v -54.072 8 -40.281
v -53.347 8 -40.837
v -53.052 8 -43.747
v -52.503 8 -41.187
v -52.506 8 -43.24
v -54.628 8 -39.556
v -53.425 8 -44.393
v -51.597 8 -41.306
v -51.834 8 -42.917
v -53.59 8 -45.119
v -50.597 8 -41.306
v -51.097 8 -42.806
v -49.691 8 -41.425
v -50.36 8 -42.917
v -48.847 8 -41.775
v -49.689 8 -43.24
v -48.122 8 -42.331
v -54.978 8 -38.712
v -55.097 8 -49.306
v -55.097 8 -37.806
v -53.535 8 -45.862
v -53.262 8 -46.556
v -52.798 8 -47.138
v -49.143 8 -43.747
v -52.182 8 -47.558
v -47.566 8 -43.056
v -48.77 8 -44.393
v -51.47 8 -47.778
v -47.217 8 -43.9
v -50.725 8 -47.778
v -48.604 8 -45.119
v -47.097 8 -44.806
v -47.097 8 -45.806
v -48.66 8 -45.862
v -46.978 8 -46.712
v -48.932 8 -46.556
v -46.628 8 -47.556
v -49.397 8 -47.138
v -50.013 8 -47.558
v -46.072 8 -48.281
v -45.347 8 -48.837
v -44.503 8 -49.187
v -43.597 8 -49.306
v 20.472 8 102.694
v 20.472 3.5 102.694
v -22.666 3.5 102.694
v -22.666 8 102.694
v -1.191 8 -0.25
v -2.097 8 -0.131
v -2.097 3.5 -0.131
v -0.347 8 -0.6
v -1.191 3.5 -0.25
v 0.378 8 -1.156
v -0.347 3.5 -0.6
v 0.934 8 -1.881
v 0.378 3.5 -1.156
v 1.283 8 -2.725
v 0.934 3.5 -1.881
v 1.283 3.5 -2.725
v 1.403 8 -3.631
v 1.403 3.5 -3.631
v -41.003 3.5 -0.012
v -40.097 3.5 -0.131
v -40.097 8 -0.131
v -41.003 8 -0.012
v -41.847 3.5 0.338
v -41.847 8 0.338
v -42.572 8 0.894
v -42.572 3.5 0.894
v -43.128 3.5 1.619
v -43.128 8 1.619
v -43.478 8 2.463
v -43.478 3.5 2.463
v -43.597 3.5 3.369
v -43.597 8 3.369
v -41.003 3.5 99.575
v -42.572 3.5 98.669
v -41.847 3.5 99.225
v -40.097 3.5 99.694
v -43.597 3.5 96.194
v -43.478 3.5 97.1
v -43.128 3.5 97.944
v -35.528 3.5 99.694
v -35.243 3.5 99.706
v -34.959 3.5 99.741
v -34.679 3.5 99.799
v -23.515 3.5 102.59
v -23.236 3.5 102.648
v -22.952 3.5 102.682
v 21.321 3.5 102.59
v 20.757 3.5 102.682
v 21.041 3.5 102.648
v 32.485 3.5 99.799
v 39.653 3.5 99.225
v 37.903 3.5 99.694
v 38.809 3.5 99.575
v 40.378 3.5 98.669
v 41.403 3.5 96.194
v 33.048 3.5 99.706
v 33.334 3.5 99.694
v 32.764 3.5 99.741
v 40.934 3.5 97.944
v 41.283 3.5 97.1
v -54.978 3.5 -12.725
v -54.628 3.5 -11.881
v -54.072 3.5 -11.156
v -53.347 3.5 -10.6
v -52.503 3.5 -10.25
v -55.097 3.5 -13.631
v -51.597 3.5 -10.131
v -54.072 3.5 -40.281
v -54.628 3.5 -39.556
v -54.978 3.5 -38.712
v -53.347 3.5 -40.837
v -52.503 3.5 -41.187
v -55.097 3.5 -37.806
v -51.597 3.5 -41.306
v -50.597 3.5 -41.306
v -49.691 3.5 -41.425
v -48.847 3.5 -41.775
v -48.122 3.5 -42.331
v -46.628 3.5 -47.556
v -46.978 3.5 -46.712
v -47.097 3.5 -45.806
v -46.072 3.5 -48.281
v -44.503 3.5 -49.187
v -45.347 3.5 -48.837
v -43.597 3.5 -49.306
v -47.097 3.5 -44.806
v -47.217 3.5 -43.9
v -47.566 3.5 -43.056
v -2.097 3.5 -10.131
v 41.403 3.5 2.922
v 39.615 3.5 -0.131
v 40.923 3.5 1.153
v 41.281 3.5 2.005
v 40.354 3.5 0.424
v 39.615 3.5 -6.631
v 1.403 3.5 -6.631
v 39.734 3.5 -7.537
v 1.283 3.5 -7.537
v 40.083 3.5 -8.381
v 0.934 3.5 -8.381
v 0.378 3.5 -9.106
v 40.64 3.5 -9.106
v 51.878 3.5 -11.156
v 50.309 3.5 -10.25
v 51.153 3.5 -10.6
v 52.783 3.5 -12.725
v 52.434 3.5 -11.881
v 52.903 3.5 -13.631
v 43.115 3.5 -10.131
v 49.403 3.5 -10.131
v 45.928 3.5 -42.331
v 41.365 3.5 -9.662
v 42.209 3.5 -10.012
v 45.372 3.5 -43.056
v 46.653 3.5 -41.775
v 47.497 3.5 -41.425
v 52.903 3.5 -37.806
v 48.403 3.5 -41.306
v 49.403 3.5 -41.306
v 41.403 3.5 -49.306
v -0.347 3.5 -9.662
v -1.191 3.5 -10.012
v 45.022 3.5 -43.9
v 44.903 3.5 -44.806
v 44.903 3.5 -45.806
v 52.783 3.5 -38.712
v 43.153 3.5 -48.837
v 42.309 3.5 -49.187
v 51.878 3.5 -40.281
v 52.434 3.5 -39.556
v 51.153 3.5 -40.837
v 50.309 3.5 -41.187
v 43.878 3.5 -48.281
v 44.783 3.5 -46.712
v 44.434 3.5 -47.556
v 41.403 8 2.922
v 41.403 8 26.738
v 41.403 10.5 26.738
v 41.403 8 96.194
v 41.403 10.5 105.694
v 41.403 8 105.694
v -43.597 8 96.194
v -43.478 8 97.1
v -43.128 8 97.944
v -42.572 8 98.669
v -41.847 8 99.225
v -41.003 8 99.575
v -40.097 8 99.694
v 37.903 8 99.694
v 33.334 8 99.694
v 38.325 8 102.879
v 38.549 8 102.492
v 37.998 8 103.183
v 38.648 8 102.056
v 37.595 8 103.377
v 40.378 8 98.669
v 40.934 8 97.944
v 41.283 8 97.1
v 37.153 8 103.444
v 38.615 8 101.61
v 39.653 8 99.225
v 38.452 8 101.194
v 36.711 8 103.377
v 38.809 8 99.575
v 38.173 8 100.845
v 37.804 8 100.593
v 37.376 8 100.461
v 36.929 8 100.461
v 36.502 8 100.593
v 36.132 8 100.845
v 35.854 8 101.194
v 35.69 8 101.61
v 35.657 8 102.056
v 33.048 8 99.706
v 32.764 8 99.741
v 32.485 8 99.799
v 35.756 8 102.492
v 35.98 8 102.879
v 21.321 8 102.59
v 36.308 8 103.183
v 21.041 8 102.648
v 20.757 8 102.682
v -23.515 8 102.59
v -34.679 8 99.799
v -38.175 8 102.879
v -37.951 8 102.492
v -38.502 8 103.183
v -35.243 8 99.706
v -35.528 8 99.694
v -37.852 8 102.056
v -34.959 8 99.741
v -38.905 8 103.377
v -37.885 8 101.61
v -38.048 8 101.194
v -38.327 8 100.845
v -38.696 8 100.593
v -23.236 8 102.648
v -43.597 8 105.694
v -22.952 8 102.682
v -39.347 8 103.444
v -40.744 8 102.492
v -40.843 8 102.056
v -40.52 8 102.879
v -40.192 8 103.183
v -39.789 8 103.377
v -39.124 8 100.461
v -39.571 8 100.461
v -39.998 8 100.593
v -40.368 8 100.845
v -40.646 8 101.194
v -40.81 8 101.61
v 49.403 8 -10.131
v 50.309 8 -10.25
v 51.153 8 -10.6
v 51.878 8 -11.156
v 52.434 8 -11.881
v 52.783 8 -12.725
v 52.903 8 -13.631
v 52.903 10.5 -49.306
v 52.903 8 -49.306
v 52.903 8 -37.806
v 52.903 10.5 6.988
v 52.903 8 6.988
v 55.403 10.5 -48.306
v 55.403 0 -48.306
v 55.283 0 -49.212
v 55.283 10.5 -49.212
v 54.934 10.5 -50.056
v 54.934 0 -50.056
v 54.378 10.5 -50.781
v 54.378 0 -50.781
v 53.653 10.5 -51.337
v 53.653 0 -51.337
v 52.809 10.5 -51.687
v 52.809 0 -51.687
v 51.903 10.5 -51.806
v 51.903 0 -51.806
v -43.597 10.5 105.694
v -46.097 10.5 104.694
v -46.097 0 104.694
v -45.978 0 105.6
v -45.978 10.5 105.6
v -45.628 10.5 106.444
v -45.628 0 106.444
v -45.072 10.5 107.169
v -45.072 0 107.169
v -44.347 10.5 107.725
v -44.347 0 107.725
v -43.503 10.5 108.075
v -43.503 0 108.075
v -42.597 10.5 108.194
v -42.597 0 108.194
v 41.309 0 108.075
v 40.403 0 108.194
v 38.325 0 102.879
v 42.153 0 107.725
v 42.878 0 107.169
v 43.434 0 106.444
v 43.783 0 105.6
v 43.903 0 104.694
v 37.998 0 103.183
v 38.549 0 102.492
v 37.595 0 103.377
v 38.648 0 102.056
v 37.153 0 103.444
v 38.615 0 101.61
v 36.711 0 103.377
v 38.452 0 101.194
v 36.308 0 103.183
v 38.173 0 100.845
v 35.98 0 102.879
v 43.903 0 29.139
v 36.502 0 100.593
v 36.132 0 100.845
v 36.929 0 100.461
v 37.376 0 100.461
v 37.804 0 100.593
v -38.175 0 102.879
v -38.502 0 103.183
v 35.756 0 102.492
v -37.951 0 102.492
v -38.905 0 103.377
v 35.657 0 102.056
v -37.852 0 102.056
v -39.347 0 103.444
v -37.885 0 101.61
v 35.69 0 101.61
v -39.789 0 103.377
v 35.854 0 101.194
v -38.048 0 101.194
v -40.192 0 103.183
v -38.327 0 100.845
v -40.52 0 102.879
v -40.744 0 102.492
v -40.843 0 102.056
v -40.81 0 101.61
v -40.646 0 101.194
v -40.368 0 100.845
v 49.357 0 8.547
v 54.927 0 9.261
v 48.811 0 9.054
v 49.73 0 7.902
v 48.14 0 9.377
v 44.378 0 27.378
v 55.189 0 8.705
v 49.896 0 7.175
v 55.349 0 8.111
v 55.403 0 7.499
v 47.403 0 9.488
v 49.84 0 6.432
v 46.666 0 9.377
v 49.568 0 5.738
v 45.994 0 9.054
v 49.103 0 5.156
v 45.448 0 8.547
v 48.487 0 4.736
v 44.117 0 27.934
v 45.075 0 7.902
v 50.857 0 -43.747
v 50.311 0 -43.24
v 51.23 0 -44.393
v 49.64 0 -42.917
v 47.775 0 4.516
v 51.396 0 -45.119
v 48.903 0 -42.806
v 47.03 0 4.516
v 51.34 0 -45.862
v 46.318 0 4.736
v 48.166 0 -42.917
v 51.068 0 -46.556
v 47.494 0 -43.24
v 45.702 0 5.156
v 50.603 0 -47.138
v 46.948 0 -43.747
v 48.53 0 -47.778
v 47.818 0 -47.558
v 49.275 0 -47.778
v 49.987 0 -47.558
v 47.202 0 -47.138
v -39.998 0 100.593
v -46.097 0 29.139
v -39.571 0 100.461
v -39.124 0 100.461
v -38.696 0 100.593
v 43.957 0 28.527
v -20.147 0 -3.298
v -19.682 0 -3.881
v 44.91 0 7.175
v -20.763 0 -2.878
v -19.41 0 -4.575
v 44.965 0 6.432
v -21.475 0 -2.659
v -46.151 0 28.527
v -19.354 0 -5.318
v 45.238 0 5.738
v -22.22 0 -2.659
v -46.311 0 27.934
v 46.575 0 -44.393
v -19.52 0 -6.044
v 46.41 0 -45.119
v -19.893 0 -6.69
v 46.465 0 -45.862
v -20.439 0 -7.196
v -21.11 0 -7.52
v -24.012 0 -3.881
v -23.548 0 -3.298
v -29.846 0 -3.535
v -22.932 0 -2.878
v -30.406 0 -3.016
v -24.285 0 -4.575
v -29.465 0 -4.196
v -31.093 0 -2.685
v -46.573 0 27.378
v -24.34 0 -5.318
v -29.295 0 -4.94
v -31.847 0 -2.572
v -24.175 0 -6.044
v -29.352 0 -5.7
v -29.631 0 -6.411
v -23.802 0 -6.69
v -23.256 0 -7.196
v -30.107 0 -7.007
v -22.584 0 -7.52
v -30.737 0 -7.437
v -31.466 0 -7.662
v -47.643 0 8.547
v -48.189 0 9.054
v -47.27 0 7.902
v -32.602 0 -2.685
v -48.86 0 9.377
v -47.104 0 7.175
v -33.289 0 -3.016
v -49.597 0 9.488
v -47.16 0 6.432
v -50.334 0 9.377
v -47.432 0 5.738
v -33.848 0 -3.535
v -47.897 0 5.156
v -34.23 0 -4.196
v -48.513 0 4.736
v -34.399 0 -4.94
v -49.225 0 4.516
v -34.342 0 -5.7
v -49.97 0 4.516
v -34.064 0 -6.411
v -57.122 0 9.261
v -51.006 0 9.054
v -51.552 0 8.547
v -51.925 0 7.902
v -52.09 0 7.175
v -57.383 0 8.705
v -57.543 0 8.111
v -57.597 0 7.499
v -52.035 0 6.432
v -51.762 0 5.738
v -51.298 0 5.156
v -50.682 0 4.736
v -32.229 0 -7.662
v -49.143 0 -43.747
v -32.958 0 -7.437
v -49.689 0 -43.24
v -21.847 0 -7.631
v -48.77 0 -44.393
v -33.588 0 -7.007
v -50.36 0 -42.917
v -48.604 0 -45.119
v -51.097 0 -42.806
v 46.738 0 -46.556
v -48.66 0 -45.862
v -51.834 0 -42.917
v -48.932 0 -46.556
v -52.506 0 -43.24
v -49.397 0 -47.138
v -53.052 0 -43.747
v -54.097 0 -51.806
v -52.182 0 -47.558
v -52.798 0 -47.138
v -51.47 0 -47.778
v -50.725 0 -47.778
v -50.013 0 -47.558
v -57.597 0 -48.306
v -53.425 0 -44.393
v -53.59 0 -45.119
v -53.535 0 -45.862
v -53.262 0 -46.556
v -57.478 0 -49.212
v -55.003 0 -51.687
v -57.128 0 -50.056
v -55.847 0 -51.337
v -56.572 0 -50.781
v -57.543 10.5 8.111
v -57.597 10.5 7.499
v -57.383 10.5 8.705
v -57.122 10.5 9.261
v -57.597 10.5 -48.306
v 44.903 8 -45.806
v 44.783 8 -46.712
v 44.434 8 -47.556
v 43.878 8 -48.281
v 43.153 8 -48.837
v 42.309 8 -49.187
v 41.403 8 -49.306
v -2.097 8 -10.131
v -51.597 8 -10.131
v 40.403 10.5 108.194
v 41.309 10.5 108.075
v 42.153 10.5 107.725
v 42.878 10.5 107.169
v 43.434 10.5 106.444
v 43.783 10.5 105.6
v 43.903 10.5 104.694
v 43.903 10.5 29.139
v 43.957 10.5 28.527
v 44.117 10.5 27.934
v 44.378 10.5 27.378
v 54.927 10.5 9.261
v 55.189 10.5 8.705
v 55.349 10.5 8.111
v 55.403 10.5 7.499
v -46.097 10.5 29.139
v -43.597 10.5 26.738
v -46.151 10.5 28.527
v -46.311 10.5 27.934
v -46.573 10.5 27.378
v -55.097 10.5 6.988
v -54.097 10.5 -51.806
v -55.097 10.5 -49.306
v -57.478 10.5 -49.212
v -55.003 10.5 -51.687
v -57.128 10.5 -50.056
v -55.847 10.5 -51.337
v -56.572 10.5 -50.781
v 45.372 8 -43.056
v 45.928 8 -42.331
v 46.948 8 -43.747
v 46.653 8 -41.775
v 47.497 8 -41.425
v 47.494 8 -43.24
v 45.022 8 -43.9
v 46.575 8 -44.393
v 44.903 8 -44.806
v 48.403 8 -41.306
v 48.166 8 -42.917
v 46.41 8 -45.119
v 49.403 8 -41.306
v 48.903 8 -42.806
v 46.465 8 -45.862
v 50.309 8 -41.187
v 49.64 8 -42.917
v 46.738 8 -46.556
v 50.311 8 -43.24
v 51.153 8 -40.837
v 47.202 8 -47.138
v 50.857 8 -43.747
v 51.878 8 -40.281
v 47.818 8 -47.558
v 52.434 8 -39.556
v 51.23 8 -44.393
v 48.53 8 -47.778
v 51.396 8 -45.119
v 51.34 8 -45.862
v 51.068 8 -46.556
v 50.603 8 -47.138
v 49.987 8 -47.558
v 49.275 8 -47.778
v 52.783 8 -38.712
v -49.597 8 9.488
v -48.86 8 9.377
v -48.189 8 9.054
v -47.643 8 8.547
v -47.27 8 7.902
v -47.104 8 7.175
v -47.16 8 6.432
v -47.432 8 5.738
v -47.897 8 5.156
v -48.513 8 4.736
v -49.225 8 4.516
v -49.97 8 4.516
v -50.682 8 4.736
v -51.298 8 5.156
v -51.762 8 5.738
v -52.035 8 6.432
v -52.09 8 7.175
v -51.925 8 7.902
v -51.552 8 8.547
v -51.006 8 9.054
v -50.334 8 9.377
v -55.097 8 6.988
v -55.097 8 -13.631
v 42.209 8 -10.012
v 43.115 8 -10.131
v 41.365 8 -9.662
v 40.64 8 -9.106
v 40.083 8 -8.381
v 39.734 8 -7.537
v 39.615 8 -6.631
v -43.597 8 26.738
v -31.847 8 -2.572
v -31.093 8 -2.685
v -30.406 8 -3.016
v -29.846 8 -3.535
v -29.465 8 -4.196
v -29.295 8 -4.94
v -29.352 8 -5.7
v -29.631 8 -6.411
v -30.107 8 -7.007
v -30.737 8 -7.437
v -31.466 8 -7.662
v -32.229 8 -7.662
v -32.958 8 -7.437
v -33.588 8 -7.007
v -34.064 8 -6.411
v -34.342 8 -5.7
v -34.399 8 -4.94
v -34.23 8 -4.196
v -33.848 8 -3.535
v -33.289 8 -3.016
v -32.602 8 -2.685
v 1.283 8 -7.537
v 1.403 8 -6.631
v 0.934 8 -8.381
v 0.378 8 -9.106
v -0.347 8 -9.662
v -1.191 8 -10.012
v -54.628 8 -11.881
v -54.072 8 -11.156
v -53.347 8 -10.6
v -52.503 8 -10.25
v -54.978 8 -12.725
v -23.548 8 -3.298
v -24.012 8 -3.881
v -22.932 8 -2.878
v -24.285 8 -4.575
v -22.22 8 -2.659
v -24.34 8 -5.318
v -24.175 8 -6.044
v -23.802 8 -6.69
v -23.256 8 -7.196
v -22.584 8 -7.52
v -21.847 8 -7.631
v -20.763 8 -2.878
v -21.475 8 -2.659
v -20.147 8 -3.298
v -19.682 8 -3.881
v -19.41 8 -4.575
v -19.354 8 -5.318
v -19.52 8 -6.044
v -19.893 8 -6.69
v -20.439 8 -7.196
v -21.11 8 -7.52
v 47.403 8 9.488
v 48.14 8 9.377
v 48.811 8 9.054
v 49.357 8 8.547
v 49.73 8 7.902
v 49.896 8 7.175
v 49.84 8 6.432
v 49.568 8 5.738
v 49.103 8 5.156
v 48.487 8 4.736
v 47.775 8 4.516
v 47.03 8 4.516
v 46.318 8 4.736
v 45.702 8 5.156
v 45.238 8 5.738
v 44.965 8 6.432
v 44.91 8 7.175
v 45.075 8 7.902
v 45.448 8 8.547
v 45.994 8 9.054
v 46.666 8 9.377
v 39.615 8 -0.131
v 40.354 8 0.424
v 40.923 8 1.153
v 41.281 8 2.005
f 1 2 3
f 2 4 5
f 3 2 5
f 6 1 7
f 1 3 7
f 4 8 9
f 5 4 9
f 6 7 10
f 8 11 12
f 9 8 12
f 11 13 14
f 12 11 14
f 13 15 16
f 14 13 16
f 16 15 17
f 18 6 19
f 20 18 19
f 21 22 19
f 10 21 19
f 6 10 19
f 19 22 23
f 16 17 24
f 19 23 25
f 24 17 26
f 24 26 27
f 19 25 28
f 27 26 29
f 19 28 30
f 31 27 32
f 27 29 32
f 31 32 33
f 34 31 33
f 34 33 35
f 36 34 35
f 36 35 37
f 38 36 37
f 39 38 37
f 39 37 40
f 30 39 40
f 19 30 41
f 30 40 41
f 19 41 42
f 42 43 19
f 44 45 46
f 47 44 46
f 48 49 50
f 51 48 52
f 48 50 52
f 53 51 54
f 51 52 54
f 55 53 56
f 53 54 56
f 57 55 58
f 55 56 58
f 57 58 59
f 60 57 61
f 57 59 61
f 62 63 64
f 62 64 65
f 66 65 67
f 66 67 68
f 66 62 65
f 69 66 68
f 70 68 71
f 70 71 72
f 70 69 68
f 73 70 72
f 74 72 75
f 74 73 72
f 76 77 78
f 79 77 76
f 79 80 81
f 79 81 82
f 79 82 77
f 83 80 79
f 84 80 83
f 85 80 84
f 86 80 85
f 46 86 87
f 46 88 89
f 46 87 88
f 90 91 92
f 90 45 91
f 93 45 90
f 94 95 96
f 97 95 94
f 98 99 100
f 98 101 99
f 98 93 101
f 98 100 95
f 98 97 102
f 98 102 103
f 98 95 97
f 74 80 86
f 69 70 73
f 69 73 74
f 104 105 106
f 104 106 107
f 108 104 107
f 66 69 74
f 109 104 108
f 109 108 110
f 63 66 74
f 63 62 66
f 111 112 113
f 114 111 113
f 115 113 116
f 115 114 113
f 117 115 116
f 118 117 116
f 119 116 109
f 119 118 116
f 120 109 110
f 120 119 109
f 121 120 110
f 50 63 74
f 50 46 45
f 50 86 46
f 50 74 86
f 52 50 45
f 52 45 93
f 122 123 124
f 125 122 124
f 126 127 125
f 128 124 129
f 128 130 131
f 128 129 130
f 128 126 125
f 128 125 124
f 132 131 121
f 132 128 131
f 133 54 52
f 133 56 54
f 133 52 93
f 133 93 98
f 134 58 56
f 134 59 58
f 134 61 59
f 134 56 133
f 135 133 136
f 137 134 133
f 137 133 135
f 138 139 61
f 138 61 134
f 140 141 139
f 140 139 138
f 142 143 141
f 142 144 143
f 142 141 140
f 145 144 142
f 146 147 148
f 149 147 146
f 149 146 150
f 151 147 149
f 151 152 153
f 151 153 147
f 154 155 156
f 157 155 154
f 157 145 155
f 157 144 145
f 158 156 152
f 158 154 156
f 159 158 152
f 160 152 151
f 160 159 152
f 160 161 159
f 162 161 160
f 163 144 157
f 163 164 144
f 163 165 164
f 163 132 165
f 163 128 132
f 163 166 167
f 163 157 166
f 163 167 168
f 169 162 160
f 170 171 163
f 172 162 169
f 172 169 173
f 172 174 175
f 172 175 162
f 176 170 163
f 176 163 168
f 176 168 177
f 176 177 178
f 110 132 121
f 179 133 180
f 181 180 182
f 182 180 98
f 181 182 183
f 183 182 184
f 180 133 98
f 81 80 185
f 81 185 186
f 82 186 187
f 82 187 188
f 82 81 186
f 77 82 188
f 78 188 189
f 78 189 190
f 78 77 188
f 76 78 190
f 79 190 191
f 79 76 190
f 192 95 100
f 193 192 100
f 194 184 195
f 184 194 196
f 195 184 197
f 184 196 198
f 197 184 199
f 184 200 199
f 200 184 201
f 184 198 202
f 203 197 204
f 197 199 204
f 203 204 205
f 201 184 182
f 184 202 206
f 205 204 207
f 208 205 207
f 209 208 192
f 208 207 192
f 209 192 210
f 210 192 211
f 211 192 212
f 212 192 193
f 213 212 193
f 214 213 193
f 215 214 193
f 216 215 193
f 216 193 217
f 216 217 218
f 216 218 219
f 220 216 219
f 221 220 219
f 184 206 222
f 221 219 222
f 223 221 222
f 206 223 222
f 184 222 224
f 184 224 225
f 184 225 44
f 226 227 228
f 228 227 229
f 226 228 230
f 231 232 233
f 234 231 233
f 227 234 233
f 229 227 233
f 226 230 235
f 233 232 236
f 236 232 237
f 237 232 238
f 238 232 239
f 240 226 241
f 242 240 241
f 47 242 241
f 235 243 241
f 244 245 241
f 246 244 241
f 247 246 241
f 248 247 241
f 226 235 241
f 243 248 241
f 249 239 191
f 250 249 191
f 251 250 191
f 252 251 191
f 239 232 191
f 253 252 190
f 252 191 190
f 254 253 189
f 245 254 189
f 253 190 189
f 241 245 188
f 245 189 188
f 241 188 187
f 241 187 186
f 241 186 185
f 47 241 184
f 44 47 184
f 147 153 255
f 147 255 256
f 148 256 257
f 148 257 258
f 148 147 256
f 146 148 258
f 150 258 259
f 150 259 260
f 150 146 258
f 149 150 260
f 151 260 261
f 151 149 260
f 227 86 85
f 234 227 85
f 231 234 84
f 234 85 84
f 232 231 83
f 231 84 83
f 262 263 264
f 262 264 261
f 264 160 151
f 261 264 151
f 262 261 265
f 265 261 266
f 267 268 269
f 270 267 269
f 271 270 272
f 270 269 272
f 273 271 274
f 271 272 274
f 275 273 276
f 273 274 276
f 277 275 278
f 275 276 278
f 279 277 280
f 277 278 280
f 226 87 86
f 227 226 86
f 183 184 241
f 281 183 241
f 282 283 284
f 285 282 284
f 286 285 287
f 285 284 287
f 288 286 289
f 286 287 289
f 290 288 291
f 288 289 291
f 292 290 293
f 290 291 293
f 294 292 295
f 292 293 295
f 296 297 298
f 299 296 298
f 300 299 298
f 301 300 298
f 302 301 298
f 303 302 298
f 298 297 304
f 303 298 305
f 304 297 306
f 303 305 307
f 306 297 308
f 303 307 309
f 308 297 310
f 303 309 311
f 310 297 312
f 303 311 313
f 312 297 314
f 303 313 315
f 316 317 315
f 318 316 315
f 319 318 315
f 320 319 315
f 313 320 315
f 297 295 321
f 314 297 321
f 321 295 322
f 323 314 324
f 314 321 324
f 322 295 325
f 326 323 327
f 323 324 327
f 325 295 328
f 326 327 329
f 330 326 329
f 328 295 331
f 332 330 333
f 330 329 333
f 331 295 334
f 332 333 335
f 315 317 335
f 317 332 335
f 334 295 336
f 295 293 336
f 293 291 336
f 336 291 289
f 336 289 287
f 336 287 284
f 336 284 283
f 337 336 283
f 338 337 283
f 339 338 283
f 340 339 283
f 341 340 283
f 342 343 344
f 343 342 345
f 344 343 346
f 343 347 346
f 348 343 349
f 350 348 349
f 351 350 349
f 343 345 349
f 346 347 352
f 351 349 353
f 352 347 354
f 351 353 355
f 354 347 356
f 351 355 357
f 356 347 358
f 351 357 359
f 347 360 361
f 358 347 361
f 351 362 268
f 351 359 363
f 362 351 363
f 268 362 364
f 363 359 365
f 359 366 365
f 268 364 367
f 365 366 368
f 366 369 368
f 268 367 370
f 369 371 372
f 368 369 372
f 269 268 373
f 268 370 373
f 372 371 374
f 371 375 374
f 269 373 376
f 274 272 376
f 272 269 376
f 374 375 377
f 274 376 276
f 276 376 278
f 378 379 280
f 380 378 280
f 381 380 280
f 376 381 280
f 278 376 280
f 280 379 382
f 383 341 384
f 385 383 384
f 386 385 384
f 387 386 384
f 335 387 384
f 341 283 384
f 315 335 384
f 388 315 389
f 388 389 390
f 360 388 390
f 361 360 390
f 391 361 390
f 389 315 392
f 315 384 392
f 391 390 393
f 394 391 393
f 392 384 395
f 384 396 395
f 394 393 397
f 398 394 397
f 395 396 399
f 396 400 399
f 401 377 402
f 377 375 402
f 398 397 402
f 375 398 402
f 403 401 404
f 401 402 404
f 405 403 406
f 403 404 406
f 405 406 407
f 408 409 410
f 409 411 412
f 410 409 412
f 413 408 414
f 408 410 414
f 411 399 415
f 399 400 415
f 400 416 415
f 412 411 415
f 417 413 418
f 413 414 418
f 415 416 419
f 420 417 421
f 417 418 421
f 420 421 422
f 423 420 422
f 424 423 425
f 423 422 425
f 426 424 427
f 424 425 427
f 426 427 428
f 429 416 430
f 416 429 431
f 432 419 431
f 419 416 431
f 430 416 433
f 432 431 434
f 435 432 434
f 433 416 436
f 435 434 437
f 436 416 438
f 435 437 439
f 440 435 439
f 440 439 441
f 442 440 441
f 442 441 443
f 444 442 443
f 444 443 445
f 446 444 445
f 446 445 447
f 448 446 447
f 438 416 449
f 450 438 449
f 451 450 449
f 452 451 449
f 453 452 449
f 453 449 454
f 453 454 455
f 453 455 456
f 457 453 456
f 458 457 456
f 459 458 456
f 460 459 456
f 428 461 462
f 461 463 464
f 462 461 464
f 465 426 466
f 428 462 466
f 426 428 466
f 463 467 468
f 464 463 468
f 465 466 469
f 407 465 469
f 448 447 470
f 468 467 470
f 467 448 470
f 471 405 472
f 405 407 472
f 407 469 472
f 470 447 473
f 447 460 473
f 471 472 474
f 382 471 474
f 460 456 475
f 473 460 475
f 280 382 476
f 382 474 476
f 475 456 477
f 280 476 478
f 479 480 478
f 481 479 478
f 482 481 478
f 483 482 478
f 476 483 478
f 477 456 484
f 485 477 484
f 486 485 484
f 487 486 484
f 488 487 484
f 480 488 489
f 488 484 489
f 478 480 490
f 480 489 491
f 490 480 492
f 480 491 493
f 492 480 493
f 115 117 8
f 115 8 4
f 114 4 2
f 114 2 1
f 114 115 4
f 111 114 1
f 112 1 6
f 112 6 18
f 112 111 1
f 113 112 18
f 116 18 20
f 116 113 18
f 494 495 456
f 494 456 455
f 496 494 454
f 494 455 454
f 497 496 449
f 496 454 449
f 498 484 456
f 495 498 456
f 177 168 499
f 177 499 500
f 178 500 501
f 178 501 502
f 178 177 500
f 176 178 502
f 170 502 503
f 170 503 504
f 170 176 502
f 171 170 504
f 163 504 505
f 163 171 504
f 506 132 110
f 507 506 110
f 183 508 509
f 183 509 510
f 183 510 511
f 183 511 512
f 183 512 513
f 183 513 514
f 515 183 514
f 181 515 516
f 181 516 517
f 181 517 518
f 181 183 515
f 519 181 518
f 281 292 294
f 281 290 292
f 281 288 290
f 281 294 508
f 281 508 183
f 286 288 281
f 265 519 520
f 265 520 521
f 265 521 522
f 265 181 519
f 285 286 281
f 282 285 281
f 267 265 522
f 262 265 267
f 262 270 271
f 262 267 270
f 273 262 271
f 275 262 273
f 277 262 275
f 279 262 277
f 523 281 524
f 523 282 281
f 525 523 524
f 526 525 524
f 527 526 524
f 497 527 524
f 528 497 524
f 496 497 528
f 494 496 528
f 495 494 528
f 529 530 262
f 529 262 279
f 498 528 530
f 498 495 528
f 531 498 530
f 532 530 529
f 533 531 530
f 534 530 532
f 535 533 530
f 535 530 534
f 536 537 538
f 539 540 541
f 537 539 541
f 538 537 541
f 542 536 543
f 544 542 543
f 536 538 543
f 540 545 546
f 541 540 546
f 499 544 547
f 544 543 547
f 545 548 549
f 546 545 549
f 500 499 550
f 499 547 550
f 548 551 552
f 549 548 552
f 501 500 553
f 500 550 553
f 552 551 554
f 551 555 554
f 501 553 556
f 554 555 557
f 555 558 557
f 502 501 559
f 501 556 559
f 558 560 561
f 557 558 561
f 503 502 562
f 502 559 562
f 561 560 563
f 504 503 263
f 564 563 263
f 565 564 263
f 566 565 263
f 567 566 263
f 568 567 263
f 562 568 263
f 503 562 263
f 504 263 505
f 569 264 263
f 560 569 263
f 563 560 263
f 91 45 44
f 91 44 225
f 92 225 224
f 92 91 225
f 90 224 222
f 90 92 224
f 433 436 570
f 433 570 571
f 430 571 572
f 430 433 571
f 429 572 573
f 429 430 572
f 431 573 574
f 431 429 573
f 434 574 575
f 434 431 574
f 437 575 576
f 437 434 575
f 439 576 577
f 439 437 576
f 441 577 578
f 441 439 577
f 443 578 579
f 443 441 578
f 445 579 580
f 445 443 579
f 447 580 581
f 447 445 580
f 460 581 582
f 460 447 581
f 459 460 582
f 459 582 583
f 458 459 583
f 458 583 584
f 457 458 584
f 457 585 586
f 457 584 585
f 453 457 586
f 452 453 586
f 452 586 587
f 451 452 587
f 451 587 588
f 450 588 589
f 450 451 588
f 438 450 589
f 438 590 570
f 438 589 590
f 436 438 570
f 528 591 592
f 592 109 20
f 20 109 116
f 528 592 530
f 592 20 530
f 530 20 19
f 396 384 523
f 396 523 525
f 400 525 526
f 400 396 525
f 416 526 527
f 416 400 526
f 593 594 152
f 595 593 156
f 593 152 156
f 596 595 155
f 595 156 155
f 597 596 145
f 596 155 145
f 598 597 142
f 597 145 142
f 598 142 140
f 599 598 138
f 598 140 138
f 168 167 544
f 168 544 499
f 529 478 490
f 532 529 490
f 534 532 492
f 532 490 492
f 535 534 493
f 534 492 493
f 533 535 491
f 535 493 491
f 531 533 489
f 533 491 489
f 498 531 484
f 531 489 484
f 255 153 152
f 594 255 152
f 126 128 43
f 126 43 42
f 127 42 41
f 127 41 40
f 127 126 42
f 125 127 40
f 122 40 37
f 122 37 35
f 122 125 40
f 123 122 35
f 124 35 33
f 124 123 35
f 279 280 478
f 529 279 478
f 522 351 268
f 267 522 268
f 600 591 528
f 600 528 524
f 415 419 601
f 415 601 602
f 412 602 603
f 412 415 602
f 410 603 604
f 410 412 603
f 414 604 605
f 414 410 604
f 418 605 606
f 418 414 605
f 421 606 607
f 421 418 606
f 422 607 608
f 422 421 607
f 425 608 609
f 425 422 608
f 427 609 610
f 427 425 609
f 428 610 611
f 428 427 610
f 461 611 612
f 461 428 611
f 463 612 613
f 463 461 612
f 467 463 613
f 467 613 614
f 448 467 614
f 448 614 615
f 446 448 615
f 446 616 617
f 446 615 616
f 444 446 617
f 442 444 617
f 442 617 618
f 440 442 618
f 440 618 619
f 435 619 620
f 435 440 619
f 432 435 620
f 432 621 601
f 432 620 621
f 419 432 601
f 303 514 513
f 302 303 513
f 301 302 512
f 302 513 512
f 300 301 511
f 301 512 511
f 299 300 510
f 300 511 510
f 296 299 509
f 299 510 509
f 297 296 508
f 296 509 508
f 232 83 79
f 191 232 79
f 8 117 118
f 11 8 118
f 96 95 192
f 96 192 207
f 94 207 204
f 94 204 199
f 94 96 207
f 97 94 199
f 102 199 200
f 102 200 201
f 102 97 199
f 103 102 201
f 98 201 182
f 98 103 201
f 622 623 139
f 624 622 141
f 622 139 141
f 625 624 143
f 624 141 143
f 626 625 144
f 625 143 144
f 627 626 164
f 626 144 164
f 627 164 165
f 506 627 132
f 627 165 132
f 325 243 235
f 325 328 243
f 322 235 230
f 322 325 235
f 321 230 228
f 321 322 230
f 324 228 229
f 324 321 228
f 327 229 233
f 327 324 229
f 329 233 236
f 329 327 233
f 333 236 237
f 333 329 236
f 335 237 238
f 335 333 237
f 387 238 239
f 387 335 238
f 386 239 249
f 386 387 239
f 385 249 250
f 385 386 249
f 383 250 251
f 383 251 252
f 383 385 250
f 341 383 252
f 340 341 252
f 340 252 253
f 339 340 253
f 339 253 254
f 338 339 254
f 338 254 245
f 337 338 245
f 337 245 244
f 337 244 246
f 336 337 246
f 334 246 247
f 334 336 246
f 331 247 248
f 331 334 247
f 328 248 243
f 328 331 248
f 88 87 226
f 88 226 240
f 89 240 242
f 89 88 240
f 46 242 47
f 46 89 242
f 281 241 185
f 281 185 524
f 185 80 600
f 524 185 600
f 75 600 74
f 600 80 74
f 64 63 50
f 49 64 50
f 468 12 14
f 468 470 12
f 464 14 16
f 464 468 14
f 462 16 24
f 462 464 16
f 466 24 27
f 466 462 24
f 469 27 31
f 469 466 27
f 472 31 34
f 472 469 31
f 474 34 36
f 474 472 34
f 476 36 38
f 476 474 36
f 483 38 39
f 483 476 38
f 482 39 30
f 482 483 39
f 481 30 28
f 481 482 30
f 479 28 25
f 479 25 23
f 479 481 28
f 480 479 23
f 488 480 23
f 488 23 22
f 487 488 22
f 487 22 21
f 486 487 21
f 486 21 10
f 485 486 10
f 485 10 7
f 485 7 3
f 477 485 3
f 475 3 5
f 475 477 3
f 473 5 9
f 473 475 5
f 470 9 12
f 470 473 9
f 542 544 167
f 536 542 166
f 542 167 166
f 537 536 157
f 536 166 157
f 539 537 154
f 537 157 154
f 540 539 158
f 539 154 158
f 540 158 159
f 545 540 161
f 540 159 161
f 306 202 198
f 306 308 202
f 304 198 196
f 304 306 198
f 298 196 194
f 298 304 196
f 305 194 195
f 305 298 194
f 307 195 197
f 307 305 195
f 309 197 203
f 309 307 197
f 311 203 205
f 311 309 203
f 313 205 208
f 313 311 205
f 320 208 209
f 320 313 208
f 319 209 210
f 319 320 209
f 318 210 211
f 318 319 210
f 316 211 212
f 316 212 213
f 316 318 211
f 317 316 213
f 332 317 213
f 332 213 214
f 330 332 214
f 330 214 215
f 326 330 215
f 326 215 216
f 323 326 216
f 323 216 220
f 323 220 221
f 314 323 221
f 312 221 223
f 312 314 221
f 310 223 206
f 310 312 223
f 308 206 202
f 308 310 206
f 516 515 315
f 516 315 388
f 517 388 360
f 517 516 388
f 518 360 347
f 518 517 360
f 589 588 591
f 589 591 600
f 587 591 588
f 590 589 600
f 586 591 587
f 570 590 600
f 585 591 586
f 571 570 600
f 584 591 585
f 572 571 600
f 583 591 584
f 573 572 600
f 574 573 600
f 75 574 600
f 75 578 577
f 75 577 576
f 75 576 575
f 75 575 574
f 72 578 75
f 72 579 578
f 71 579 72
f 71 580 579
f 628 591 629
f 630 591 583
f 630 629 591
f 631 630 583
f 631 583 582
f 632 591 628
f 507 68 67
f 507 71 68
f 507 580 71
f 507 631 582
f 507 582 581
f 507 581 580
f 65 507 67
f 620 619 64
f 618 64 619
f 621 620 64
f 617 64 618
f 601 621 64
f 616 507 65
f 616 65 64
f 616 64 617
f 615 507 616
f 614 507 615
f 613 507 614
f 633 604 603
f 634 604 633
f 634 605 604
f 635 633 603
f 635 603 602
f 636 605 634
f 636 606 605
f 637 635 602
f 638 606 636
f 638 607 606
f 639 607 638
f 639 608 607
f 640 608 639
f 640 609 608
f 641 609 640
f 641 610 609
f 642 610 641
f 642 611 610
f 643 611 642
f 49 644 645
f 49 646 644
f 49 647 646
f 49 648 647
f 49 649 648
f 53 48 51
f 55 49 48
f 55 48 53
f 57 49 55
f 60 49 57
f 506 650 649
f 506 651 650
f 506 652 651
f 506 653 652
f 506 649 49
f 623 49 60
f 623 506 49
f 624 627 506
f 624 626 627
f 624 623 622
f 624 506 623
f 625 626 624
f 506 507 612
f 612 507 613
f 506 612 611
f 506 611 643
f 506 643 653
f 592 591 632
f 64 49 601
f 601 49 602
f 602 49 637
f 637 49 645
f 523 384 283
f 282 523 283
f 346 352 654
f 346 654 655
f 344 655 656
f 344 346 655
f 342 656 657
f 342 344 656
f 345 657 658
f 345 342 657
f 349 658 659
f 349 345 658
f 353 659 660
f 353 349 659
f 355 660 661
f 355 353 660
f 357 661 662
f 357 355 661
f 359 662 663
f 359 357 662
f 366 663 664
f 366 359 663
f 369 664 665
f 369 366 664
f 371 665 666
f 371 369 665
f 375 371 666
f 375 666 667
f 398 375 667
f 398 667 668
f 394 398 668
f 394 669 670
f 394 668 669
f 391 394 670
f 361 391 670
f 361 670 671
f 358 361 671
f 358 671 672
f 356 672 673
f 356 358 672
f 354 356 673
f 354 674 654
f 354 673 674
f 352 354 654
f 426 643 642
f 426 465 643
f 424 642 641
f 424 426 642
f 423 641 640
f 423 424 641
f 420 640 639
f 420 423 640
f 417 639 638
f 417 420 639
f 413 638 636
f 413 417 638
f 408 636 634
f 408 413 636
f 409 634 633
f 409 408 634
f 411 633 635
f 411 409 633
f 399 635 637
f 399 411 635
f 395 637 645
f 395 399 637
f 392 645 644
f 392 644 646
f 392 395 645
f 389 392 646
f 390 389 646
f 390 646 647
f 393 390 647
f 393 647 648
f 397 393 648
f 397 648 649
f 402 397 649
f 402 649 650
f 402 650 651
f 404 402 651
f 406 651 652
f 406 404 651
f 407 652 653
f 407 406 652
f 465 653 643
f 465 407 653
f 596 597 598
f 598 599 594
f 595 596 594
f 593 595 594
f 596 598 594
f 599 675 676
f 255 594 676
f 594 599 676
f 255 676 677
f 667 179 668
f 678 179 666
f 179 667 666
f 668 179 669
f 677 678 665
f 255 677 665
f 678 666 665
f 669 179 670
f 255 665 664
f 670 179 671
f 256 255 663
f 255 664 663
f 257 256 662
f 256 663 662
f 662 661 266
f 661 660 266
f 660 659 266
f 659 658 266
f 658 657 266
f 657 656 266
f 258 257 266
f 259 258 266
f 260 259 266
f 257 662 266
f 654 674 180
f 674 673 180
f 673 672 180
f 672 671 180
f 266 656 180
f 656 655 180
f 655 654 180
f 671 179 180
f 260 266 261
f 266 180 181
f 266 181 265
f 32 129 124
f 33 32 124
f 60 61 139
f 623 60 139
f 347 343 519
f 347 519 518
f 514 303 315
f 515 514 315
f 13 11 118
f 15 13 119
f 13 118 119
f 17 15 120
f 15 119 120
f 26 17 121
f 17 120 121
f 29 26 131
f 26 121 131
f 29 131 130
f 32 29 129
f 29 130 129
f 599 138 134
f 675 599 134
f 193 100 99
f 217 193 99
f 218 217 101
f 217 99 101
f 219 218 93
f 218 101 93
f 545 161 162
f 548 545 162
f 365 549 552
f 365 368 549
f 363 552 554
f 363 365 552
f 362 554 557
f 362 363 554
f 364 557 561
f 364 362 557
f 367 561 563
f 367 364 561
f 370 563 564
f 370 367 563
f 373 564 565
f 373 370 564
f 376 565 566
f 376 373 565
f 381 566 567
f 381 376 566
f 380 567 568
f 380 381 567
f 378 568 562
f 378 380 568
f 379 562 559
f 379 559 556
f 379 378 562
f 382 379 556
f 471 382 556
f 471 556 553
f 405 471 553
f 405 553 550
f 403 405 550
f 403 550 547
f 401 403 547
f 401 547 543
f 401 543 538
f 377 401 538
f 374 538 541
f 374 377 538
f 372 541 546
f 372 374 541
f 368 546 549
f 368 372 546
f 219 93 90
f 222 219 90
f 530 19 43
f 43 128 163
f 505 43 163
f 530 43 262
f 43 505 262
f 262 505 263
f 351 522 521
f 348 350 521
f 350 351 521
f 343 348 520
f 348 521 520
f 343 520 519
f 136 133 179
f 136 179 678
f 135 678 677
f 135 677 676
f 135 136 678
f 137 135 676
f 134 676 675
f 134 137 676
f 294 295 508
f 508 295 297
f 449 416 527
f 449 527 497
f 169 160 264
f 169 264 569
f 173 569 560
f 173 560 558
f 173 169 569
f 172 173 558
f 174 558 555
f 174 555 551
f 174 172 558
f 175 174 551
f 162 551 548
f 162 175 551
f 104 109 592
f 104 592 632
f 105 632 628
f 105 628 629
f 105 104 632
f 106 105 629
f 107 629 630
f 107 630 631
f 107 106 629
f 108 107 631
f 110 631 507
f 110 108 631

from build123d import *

# Parameters (mm, degrees)
BOSS_EXTRUDE1_DEPTH     = 3.5
BOSS_EXTRUDE2_DEPTH     = 7
SKETCH3_R               = 1.5
SKETCH3_W               = 8
SKETCH3_H               = 8
SKETCH3_R_2             = 2.5
BOSS_EXTRUDE3_DEPTH     = 4.5
SKETCH4_R               = 2.5
BOSS_EXTRUDE4_DEPTH     = 4.5
CUT_EXTRUDE1_DEPTH      = 123.693401635
CUT_EXTRUDE1_DEPTH_BACK = 123.693401635
SKETCH5_R               = 2.5
SKETCH5_R_2             = 2.55926668
SKETCH5_R_3             = 1.5
FILLET1_R               = 3.5


with BuildPart() as part:
    # Sketch1 → Boss-Extrude1 (new body)
    with BuildSketch(Plane(origin=(0, 0, 0), x_dir=(1, 0, 0), z_dir=(0, 1, 0))):
        Polygon((-57.597316241, 51.805869074), (-57.597316241, -8.444130926), (-46.097316241, -28.194130926), (-46.097316241, -108.194130926), (43.902683759, -108.194130926), (43.902683759, -28.194130926), (55.402683759, -8.444130926), (55.402683759, 51.805869074), align=None)
    extrude(amount=BOSS_EXTRUDE1_DEPTH)

    # Sketch2 → Boss-Extrude2 (add)
    with BuildSketch(Plane(origin=(0, 3.5, 0), x_dir=(1, 0, 0), z_dir=(0, 1, 0))):
        Polygon((-46.097316241, -28.194130926), (-46.097316241, -108.194130926), (43.902683759, -108.194130926), (43.902683759, -28.194130926), (41.402683759, -28.194130926), (41.402683759, -105.694130926), (-43.597316241, -105.694130926), (-43.597316241, -28.194130926), align=None)
        Polygon((52.902683759, -6.988434723), (55.402683759, -8.444130926), (43.902683759, -28.194130926), (41.402683759, -26.738434723), align=None)
        Polygon((41.402683759, -28.194130926), (43.902683759, -28.194130926), (41.402683759, -26.738434723), align=None)
        Polygon((52.902683759, -6.988434723), (55.402683759, -8.444130926), (55.402683759, -6.988434723), align=None)
        Polygon((-57.597316241, 51.805869074), (-57.597316241, -6.988434723), (-55.097316241, -6.988434723), (-55.097316241, 49.305869074), (52.902683759, 49.305869074), (52.902683759, -6.988434723), (55.402683759, -6.988434723), (55.402683759, 51.805869074), align=None)
        Polygon((-43.597316241, -26.738434723), (-46.097316241, -28.194130926), (-43.597316241, -28.194130926), align=None)
        Polygon((-43.597316241, -26.738434723), (-46.097316241, -28.194130926), (-57.597316241, -8.444130926), (-55.097316241, -6.988434723), align=None)
        Polygon((-57.597316241, -6.988434723), (-57.597316241, -8.444130926), (-55.097316241, -6.988434723), align=None)
    extrude(amount=BOSS_EXTRUDE2_DEPTH)

    # Sketch3 → Boss-Extrude3 (add)
    # profile 1 of 3: a face of its own
    with BuildSketch(Plane(origin=(0, 3.5, 0), x_dir=(1, 0, 0), z_dir=(0, 1, 0))):
        Polygon((-43.597316241, -99.694130926), (-43.597316241, -105.694130926), (41.402683759, -105.694130926), (41.402683759, -99.694130926), (32.902683759, -99.694130926), (20.902683759, -102.694130926), (-23.097316241, -102.694130926), (-35.097316241, -99.694130926), align=None)
        with Locations(Location((-39.347316241, -101.944130926, 0), (0, 0, 270))):
            Circle(SKETCH3_R, mode=Mode.SUBTRACT)
        with Locations(Location((37.152683759, -101.944130926, 0), (0, 0, 270))):
            Circle(SKETCH3_R, mode=Mode.SUBTRACT)
    # profile 2 of 3: a face of its own
    with BuildSketch(Plane(origin=(0, 3.5, 0), x_dir=(1, 0, 0), z_dir=(0, 1, 0))):
        with Locations((-51.097316241, 45.305869074)):
            Rectangle(SKETCH3_W, SKETCH3_H)
        with Locations(Location((-51.097316241, 45.305869074, 0), (0, 0, 270))):
            Circle(SKETCH3_R_2, mode=Mode.SUBTRACT)
    # profile 3 of 3: a face of its own
    with BuildSketch(Plane(origin=(0, 3.5, 0), x_dir=(1, 0, 0), z_dir=(0, 1, 0))):
        with Locations((48.902683759, 45.305869074)):
            Rectangle(SKETCH3_W, SKETCH3_H)
        with Locations(Location((48.902683759, 45.305869074, 0), (0, 0, 270))):
            Circle(SKETCH3_R_2, mode=Mode.SUBTRACT)
    extrude(amount=BOSS_EXTRUDE3_DEPTH)

    # Sketch4 → Boss-Extrude4 (add)
    # profile 1 of 2: a face of its own
    with BuildSketch(Plane(origin=(0, 3.5, 0), x_dir=(1, 0, 0), z_dir=(0, 1, 0))):
        Polygon((1.402683759, 10.130869074), (-55.097316241, 10.130869074), (-55.097316241, -6.988434723), (-43.597316241, -26.738434723), (-43.597316241, 0.130869074), (1.402683759, 0.130869074), align=None)
        with Locations(Location((-31.847316241, 5.130869074, 0), (0, 0, 90))):
            Circle(SKETCH4_R, mode=Mode.SUBTRACT)
        with Locations(Location((-21.847316241, 5.130869074, 0), (0, 0, 90))):
            Circle(SKETCH4_R, mode=Mode.SUBTRACT)
    # profile 2 of 2: a face of its own
    with BuildSketch(Plane(origin=(0, 3.5, 0), x_dir=(1, 0, 0), z_dir=(0, 1, 0))):
        Polygon((39.6145491, 10.130869074), (39.6145491, 0.130869074), (41.402683759, 0.130869074), (41.402683759, -26.738434723), (52.902683759, -6.988434723), (52.902683759, 10.130869074), align=None)
    extrude(amount=BOSS_EXTRUDE4_DEPTH)

    # Sketch5 → Cut-Extrude1 (cut, two sides: drawn at the far end of the back side and taken through both)
    with BuildSketch(Plane(origin=(0, 5, 0), x_dir=(1, 0, 0), z_dir=(0, 1, 0)).offset(-CUT_EXTRUDE1_DEPTH_BACK)):
        with Locations(Location((-21.847316241, 5.130869074, 0), (0, 0, 90))):
            Circle(SKETCH5_R)
        with Locations(Location((-31.847316241, 5.130869074, 0), (0, 0, 270))):
            Circle(SKETCH5_R_2)
        with Locations(Location((-39.347316241, -101.944130926, 0), (0, 0, 270))):
            Circle(SKETCH5_R_3)
        with Locations(Location((37.152683759, -101.944130926, 0), (0, 0, 270))):
            Circle(SKETCH5_R_3)
        with Locations(Location((-51.097316241, 45.305869074, 0), (0, 0, 270))):
            Circle(SKETCH5_R)
        with Locations(Location((48.902683759, 45.305869074, 0), (0, 0, 270))):
            Circle(SKETCH5_R)
        with Locations(Location((-49.597316241, -6.988434723, 0), (0, 0, 270))):
            Circle(SKETCH5_R)
        with Locations(Location((47.402683759, -6.988434723, 0), (0, 0, 270))):
            Circle(SKETCH5_R)
    extrude(amount=CUT_EXTRUDE1_DEPTH + CUT_EXTRUDE1_DEPTH_BACK, mode=Mode.SUBTRACT)

    # Fillet1
    # the kernel refuses this fillet: 3.5 mm, written as the material it adds along each edge
    with BuildSketch(Plane(origin=(41.402683759, 3.5, 99.694130926), x_dir=(0, 0, -1), z_dir=(0, 1, 0)), Plane(origin=(-43.597316241, 3.5, 99.694130926), x_dir=(1, 0, 0), z_dir=(0, 1, 0)), Plane(origin=(-55.097316241, 3.5, -41.305869074), x_dir=(0, 0, 1), z_dir=(0, 1, 0)), Plane(origin=(-47.097316241, 3.5, -49.305869074), x_dir=(0, 0, 1), z_dir=(0, 1, 0)), Plane(origin=(52.902683759, 3.5, -41.305869074), x_dir=(-1, 0, 0), z_dir=(0, 1, 0)), Plane(origin=(-55.097316241, 3.5, -10.130869074), x_dir=(1, 0, 0), z_dir=(0, 1, 0))) as fillet1_piece_1:
        with BuildLine():
            CenterArc((FILLET1_R, FILLET1_R), FILLET1_R, 180, 90)
            Line((0, FILLET1_R), (0, 0))
            Line((0, 0), (FILLET1_R, 0))
        make_face()
    extrude(amount=4.5)
    with BuildSketch(Plane(origin=(20.902683759, 2.422825776, 102.694130926), x_dir=(0.9701425001453338, 0, -0.2425356250363252), z_dir=(0, 1, 0)), Plane(origin=(-23.097316241, 2.422825776, 102.694130926), x_dir=(1, 0, 0), z_dir=(0, 1, 0))) as fillet1_piece_2:
        with BuildLine():
            CenterArc((FILLET1_R * 0.123105625618, FILLET1_R), FILLET1_R, 255.963756532, 14.036243468)
            Line((-FILLET1_R * 0.119429999419, FILLET1_R * 0.0298574998547), (0, 0))
            Line((0, 0), (FILLET1_R * 0.123105625618, 0))
        make_face()
    extrude(amount=5.577174224)
    with BuildSketch(Plane(origin=(44.902683759, 3.5, -49.305869074), x_dir=(0, 0, 1), z_dir=(0, 1, 0)), Plane(origin=(52.902683759, 3.5, -10.130869074), x_dir=(-1, 0, 0), z_dir=(0, 1, 0)), Plane(origin=(-43.597316241, 3.5, -0.130869074), x_dir=(1, 0, 0), z_dir=(0, 1, 0))) as fillet1_piece_3:
        with BuildLine():
            CenterArc((FILLET1_R, -FILLET1_R), FILLET1_R, 90, 90)
            Line((0, -FILLET1_R), (0, 0))
            Line((0, 0), (FILLET1_R, 0))
        make_face()
    extrude(amount=4.5)
    with BuildSketch(Plane(origin=(43.902683759, 10.5, 28.194130926), x_dir=(0, 0, 1), z_dir=(0, -1, 0)), Plane(origin=(-46.097316241, 0, 28.194130926), x_dir=(0, 0, 1), z_dir=(0, 1, 0))) as fillet1_piece_4:
        with BuildLine():
            CenterArc((FILLET1_R * 0.269926710528, -FILLET1_R), FILLET1_R, 90, 30.211322386)
            Line((-FILLET1_R * 0.23326401814, -FILLET1_R * 0.135824618157), (0, 0))
            Line((0, 0), (FILLET1_R * 0.269926710528, 0))
        make_face()
    extrude(amount=10.5)
    with BuildSketch(Plane(origin=(41.402683759, 3.5, -0.130869074), x_dir=(-1, 0, 0), z_dir=(0, 1, 0))) as fillet1_piece_5:
        with BuildLine():
            CenterArc((3.5, 3.052788407), FILLET1_R, 180, 60.718267745)
            Line((0, 3.052788407), (0, 0))
            Line((0, 0), (1.788134659, 0))
        make_face()
    extrude(amount=4.5)
    # the kernel refuses this fillet: 3.5 mm, written as the material it takes off along each edge
    with BuildSketch(Plane(origin=(32.902683759, 3.5, 99.694130926), x_dir=(-0.9701425001453338, 0, 0.2425356250363252), z_dir=(0, 1, 0)), Plane(origin=(-35.097316241, 3.5, 99.694130926), x_dir=(-1, 0, 0), z_dir=(0, 1, 0))) as fillet1_2_piece_1:
        with BuildLine():
            CenterArc((FILLET1_R * 0.123105625618, FILLET1_R), FILLET1_R, 255.963756532, 14.036243468)
            Line((-FILLET1_R * 0.119429999419, FILLET1_R * 0.0298574998547), (0, 0))
            Line((0, 0), (FILLET1_R * 0.123105625618, 0))
        make_face()
    extrude(amount=5.577174224, mode=Mode.SUBTRACT)
    with BuildSketch(Plane(origin=(-47.097316241, 3.5, -41.305869074), x_dir=(0, 0, -1), z_dir=(0, 1, 0)), Plane(origin=(44.902683759, 3.5, -41.305869074), x_dir=(1, 0, 0), z_dir=(0, 1, 0)), Plane(origin=(39.6145491, 3.5, -10.130869074), x_dir=(0, 0, 1), z_dir=(0, 1, 0)), Plane(origin=(1.402683759, 3.5, -10.130869074), x_dir=(-1, 0, 0), z_dir=(0, 1, 0)), Plane(origin=(1.402683759, 3.5, -0.130869074), x_dir=(0, 0, -1), z_dir=(0, 1, 0))) as fillet1_2_piece_2:
        with BuildLine():
            CenterArc((FILLET1_R, FILLET1_R), FILLET1_R, 180, 90)
            Line((0, FILLET1_R), (0, 0))
            Line((0, 0), (FILLET1_R, 0))
        make_face()
    extrude(amount=13.25, mode=Mode.SUBTRACT)
    with BuildSketch(Plane(origin=(55.402683759, 12.861858717, 8.444130926), x_dir=(0, 0, -1), z_dir=(0, -1, 0))) as fillet1_2_piece_3:
        with BuildLine():
            CenterArc((FILLET1_R * 0.269926710528, -FILLET1_R), FILLET1_R, 90, 30.211322386)
            Line((-FILLET1_R * 0.23326401814, -FILLET1_R * 0.135824618157), (0, 0))
            Line((0, 0), (FILLET1_R * 0.269926710528, 0))
        make_face()
    extrude(amount=15.223717434, mode=Mode.SUBTRACT)
    with BuildSketch(Plane(origin=(43.902683759, 19.25, 108.194130926), x_dir=(0, 0, -1), z_dir=(0, -1, 0)), Plane(origin=(55.402683759, -8.75, -51.805869074), x_dir=(0, 0, 1), z_dir=(0, 1, 0))) as fillet1_2_piece_4:
        with BuildLine():
            CenterArc((FILLET1_R, -FILLET1_R), FILLET1_R, 90, 90)
            Line((0, -FILLET1_R), (0, 0))
            Line((0, 0), (FILLET1_R, 0))
        make_face()
    extrude(amount=28, mode=Mode.SUBTRACT)
    with BuildSketch(Plane(origin=(-46.097316241, -8.75, 108.194130926), x_dir=(1, 0, 0), z_dir=(0, 1, 0)), Plane(origin=(-57.597316241, -8.75, -51.805869074), x_dir=(0, 0, 1), z_dir=(0, 1, 0))) as fillet1_2_piece_5:
        with BuildLine():
            CenterArc((FILLET1_R, FILLET1_R), FILLET1_R, 180, 90)
            Line((0, FILLET1_R), (0, 0))
            Line((0, 0), (FILLET1_R, 0))
        make_face()
    extrude(amount=28, mode=Mode.SUBTRACT)
    with BuildSketch(Plane(origin=(-57.597316241, -2.361858717, 8.444130926), x_dir=(0.5031907286678244, 0, 0.8641753818425655), z_dir=(0, 1, 0))) as fillet1_2_piece_6:
        with BuildLine():
            CenterArc((FILLET1_R * 0.269926710528, FILLET1_R), FILLET1_R, 239.788677614, 30.211322386)
            Line((-FILLET1_R * 0.23326401814, FILLET1_R * 0.135824618157), (0, 0))
            Line((0, 0), (FILLET1_R * 0.269926710528, 0))
        make_face()
    extrude(amount=15.223717434, mode=Mode.SUBTRACT)


solid = part.part
